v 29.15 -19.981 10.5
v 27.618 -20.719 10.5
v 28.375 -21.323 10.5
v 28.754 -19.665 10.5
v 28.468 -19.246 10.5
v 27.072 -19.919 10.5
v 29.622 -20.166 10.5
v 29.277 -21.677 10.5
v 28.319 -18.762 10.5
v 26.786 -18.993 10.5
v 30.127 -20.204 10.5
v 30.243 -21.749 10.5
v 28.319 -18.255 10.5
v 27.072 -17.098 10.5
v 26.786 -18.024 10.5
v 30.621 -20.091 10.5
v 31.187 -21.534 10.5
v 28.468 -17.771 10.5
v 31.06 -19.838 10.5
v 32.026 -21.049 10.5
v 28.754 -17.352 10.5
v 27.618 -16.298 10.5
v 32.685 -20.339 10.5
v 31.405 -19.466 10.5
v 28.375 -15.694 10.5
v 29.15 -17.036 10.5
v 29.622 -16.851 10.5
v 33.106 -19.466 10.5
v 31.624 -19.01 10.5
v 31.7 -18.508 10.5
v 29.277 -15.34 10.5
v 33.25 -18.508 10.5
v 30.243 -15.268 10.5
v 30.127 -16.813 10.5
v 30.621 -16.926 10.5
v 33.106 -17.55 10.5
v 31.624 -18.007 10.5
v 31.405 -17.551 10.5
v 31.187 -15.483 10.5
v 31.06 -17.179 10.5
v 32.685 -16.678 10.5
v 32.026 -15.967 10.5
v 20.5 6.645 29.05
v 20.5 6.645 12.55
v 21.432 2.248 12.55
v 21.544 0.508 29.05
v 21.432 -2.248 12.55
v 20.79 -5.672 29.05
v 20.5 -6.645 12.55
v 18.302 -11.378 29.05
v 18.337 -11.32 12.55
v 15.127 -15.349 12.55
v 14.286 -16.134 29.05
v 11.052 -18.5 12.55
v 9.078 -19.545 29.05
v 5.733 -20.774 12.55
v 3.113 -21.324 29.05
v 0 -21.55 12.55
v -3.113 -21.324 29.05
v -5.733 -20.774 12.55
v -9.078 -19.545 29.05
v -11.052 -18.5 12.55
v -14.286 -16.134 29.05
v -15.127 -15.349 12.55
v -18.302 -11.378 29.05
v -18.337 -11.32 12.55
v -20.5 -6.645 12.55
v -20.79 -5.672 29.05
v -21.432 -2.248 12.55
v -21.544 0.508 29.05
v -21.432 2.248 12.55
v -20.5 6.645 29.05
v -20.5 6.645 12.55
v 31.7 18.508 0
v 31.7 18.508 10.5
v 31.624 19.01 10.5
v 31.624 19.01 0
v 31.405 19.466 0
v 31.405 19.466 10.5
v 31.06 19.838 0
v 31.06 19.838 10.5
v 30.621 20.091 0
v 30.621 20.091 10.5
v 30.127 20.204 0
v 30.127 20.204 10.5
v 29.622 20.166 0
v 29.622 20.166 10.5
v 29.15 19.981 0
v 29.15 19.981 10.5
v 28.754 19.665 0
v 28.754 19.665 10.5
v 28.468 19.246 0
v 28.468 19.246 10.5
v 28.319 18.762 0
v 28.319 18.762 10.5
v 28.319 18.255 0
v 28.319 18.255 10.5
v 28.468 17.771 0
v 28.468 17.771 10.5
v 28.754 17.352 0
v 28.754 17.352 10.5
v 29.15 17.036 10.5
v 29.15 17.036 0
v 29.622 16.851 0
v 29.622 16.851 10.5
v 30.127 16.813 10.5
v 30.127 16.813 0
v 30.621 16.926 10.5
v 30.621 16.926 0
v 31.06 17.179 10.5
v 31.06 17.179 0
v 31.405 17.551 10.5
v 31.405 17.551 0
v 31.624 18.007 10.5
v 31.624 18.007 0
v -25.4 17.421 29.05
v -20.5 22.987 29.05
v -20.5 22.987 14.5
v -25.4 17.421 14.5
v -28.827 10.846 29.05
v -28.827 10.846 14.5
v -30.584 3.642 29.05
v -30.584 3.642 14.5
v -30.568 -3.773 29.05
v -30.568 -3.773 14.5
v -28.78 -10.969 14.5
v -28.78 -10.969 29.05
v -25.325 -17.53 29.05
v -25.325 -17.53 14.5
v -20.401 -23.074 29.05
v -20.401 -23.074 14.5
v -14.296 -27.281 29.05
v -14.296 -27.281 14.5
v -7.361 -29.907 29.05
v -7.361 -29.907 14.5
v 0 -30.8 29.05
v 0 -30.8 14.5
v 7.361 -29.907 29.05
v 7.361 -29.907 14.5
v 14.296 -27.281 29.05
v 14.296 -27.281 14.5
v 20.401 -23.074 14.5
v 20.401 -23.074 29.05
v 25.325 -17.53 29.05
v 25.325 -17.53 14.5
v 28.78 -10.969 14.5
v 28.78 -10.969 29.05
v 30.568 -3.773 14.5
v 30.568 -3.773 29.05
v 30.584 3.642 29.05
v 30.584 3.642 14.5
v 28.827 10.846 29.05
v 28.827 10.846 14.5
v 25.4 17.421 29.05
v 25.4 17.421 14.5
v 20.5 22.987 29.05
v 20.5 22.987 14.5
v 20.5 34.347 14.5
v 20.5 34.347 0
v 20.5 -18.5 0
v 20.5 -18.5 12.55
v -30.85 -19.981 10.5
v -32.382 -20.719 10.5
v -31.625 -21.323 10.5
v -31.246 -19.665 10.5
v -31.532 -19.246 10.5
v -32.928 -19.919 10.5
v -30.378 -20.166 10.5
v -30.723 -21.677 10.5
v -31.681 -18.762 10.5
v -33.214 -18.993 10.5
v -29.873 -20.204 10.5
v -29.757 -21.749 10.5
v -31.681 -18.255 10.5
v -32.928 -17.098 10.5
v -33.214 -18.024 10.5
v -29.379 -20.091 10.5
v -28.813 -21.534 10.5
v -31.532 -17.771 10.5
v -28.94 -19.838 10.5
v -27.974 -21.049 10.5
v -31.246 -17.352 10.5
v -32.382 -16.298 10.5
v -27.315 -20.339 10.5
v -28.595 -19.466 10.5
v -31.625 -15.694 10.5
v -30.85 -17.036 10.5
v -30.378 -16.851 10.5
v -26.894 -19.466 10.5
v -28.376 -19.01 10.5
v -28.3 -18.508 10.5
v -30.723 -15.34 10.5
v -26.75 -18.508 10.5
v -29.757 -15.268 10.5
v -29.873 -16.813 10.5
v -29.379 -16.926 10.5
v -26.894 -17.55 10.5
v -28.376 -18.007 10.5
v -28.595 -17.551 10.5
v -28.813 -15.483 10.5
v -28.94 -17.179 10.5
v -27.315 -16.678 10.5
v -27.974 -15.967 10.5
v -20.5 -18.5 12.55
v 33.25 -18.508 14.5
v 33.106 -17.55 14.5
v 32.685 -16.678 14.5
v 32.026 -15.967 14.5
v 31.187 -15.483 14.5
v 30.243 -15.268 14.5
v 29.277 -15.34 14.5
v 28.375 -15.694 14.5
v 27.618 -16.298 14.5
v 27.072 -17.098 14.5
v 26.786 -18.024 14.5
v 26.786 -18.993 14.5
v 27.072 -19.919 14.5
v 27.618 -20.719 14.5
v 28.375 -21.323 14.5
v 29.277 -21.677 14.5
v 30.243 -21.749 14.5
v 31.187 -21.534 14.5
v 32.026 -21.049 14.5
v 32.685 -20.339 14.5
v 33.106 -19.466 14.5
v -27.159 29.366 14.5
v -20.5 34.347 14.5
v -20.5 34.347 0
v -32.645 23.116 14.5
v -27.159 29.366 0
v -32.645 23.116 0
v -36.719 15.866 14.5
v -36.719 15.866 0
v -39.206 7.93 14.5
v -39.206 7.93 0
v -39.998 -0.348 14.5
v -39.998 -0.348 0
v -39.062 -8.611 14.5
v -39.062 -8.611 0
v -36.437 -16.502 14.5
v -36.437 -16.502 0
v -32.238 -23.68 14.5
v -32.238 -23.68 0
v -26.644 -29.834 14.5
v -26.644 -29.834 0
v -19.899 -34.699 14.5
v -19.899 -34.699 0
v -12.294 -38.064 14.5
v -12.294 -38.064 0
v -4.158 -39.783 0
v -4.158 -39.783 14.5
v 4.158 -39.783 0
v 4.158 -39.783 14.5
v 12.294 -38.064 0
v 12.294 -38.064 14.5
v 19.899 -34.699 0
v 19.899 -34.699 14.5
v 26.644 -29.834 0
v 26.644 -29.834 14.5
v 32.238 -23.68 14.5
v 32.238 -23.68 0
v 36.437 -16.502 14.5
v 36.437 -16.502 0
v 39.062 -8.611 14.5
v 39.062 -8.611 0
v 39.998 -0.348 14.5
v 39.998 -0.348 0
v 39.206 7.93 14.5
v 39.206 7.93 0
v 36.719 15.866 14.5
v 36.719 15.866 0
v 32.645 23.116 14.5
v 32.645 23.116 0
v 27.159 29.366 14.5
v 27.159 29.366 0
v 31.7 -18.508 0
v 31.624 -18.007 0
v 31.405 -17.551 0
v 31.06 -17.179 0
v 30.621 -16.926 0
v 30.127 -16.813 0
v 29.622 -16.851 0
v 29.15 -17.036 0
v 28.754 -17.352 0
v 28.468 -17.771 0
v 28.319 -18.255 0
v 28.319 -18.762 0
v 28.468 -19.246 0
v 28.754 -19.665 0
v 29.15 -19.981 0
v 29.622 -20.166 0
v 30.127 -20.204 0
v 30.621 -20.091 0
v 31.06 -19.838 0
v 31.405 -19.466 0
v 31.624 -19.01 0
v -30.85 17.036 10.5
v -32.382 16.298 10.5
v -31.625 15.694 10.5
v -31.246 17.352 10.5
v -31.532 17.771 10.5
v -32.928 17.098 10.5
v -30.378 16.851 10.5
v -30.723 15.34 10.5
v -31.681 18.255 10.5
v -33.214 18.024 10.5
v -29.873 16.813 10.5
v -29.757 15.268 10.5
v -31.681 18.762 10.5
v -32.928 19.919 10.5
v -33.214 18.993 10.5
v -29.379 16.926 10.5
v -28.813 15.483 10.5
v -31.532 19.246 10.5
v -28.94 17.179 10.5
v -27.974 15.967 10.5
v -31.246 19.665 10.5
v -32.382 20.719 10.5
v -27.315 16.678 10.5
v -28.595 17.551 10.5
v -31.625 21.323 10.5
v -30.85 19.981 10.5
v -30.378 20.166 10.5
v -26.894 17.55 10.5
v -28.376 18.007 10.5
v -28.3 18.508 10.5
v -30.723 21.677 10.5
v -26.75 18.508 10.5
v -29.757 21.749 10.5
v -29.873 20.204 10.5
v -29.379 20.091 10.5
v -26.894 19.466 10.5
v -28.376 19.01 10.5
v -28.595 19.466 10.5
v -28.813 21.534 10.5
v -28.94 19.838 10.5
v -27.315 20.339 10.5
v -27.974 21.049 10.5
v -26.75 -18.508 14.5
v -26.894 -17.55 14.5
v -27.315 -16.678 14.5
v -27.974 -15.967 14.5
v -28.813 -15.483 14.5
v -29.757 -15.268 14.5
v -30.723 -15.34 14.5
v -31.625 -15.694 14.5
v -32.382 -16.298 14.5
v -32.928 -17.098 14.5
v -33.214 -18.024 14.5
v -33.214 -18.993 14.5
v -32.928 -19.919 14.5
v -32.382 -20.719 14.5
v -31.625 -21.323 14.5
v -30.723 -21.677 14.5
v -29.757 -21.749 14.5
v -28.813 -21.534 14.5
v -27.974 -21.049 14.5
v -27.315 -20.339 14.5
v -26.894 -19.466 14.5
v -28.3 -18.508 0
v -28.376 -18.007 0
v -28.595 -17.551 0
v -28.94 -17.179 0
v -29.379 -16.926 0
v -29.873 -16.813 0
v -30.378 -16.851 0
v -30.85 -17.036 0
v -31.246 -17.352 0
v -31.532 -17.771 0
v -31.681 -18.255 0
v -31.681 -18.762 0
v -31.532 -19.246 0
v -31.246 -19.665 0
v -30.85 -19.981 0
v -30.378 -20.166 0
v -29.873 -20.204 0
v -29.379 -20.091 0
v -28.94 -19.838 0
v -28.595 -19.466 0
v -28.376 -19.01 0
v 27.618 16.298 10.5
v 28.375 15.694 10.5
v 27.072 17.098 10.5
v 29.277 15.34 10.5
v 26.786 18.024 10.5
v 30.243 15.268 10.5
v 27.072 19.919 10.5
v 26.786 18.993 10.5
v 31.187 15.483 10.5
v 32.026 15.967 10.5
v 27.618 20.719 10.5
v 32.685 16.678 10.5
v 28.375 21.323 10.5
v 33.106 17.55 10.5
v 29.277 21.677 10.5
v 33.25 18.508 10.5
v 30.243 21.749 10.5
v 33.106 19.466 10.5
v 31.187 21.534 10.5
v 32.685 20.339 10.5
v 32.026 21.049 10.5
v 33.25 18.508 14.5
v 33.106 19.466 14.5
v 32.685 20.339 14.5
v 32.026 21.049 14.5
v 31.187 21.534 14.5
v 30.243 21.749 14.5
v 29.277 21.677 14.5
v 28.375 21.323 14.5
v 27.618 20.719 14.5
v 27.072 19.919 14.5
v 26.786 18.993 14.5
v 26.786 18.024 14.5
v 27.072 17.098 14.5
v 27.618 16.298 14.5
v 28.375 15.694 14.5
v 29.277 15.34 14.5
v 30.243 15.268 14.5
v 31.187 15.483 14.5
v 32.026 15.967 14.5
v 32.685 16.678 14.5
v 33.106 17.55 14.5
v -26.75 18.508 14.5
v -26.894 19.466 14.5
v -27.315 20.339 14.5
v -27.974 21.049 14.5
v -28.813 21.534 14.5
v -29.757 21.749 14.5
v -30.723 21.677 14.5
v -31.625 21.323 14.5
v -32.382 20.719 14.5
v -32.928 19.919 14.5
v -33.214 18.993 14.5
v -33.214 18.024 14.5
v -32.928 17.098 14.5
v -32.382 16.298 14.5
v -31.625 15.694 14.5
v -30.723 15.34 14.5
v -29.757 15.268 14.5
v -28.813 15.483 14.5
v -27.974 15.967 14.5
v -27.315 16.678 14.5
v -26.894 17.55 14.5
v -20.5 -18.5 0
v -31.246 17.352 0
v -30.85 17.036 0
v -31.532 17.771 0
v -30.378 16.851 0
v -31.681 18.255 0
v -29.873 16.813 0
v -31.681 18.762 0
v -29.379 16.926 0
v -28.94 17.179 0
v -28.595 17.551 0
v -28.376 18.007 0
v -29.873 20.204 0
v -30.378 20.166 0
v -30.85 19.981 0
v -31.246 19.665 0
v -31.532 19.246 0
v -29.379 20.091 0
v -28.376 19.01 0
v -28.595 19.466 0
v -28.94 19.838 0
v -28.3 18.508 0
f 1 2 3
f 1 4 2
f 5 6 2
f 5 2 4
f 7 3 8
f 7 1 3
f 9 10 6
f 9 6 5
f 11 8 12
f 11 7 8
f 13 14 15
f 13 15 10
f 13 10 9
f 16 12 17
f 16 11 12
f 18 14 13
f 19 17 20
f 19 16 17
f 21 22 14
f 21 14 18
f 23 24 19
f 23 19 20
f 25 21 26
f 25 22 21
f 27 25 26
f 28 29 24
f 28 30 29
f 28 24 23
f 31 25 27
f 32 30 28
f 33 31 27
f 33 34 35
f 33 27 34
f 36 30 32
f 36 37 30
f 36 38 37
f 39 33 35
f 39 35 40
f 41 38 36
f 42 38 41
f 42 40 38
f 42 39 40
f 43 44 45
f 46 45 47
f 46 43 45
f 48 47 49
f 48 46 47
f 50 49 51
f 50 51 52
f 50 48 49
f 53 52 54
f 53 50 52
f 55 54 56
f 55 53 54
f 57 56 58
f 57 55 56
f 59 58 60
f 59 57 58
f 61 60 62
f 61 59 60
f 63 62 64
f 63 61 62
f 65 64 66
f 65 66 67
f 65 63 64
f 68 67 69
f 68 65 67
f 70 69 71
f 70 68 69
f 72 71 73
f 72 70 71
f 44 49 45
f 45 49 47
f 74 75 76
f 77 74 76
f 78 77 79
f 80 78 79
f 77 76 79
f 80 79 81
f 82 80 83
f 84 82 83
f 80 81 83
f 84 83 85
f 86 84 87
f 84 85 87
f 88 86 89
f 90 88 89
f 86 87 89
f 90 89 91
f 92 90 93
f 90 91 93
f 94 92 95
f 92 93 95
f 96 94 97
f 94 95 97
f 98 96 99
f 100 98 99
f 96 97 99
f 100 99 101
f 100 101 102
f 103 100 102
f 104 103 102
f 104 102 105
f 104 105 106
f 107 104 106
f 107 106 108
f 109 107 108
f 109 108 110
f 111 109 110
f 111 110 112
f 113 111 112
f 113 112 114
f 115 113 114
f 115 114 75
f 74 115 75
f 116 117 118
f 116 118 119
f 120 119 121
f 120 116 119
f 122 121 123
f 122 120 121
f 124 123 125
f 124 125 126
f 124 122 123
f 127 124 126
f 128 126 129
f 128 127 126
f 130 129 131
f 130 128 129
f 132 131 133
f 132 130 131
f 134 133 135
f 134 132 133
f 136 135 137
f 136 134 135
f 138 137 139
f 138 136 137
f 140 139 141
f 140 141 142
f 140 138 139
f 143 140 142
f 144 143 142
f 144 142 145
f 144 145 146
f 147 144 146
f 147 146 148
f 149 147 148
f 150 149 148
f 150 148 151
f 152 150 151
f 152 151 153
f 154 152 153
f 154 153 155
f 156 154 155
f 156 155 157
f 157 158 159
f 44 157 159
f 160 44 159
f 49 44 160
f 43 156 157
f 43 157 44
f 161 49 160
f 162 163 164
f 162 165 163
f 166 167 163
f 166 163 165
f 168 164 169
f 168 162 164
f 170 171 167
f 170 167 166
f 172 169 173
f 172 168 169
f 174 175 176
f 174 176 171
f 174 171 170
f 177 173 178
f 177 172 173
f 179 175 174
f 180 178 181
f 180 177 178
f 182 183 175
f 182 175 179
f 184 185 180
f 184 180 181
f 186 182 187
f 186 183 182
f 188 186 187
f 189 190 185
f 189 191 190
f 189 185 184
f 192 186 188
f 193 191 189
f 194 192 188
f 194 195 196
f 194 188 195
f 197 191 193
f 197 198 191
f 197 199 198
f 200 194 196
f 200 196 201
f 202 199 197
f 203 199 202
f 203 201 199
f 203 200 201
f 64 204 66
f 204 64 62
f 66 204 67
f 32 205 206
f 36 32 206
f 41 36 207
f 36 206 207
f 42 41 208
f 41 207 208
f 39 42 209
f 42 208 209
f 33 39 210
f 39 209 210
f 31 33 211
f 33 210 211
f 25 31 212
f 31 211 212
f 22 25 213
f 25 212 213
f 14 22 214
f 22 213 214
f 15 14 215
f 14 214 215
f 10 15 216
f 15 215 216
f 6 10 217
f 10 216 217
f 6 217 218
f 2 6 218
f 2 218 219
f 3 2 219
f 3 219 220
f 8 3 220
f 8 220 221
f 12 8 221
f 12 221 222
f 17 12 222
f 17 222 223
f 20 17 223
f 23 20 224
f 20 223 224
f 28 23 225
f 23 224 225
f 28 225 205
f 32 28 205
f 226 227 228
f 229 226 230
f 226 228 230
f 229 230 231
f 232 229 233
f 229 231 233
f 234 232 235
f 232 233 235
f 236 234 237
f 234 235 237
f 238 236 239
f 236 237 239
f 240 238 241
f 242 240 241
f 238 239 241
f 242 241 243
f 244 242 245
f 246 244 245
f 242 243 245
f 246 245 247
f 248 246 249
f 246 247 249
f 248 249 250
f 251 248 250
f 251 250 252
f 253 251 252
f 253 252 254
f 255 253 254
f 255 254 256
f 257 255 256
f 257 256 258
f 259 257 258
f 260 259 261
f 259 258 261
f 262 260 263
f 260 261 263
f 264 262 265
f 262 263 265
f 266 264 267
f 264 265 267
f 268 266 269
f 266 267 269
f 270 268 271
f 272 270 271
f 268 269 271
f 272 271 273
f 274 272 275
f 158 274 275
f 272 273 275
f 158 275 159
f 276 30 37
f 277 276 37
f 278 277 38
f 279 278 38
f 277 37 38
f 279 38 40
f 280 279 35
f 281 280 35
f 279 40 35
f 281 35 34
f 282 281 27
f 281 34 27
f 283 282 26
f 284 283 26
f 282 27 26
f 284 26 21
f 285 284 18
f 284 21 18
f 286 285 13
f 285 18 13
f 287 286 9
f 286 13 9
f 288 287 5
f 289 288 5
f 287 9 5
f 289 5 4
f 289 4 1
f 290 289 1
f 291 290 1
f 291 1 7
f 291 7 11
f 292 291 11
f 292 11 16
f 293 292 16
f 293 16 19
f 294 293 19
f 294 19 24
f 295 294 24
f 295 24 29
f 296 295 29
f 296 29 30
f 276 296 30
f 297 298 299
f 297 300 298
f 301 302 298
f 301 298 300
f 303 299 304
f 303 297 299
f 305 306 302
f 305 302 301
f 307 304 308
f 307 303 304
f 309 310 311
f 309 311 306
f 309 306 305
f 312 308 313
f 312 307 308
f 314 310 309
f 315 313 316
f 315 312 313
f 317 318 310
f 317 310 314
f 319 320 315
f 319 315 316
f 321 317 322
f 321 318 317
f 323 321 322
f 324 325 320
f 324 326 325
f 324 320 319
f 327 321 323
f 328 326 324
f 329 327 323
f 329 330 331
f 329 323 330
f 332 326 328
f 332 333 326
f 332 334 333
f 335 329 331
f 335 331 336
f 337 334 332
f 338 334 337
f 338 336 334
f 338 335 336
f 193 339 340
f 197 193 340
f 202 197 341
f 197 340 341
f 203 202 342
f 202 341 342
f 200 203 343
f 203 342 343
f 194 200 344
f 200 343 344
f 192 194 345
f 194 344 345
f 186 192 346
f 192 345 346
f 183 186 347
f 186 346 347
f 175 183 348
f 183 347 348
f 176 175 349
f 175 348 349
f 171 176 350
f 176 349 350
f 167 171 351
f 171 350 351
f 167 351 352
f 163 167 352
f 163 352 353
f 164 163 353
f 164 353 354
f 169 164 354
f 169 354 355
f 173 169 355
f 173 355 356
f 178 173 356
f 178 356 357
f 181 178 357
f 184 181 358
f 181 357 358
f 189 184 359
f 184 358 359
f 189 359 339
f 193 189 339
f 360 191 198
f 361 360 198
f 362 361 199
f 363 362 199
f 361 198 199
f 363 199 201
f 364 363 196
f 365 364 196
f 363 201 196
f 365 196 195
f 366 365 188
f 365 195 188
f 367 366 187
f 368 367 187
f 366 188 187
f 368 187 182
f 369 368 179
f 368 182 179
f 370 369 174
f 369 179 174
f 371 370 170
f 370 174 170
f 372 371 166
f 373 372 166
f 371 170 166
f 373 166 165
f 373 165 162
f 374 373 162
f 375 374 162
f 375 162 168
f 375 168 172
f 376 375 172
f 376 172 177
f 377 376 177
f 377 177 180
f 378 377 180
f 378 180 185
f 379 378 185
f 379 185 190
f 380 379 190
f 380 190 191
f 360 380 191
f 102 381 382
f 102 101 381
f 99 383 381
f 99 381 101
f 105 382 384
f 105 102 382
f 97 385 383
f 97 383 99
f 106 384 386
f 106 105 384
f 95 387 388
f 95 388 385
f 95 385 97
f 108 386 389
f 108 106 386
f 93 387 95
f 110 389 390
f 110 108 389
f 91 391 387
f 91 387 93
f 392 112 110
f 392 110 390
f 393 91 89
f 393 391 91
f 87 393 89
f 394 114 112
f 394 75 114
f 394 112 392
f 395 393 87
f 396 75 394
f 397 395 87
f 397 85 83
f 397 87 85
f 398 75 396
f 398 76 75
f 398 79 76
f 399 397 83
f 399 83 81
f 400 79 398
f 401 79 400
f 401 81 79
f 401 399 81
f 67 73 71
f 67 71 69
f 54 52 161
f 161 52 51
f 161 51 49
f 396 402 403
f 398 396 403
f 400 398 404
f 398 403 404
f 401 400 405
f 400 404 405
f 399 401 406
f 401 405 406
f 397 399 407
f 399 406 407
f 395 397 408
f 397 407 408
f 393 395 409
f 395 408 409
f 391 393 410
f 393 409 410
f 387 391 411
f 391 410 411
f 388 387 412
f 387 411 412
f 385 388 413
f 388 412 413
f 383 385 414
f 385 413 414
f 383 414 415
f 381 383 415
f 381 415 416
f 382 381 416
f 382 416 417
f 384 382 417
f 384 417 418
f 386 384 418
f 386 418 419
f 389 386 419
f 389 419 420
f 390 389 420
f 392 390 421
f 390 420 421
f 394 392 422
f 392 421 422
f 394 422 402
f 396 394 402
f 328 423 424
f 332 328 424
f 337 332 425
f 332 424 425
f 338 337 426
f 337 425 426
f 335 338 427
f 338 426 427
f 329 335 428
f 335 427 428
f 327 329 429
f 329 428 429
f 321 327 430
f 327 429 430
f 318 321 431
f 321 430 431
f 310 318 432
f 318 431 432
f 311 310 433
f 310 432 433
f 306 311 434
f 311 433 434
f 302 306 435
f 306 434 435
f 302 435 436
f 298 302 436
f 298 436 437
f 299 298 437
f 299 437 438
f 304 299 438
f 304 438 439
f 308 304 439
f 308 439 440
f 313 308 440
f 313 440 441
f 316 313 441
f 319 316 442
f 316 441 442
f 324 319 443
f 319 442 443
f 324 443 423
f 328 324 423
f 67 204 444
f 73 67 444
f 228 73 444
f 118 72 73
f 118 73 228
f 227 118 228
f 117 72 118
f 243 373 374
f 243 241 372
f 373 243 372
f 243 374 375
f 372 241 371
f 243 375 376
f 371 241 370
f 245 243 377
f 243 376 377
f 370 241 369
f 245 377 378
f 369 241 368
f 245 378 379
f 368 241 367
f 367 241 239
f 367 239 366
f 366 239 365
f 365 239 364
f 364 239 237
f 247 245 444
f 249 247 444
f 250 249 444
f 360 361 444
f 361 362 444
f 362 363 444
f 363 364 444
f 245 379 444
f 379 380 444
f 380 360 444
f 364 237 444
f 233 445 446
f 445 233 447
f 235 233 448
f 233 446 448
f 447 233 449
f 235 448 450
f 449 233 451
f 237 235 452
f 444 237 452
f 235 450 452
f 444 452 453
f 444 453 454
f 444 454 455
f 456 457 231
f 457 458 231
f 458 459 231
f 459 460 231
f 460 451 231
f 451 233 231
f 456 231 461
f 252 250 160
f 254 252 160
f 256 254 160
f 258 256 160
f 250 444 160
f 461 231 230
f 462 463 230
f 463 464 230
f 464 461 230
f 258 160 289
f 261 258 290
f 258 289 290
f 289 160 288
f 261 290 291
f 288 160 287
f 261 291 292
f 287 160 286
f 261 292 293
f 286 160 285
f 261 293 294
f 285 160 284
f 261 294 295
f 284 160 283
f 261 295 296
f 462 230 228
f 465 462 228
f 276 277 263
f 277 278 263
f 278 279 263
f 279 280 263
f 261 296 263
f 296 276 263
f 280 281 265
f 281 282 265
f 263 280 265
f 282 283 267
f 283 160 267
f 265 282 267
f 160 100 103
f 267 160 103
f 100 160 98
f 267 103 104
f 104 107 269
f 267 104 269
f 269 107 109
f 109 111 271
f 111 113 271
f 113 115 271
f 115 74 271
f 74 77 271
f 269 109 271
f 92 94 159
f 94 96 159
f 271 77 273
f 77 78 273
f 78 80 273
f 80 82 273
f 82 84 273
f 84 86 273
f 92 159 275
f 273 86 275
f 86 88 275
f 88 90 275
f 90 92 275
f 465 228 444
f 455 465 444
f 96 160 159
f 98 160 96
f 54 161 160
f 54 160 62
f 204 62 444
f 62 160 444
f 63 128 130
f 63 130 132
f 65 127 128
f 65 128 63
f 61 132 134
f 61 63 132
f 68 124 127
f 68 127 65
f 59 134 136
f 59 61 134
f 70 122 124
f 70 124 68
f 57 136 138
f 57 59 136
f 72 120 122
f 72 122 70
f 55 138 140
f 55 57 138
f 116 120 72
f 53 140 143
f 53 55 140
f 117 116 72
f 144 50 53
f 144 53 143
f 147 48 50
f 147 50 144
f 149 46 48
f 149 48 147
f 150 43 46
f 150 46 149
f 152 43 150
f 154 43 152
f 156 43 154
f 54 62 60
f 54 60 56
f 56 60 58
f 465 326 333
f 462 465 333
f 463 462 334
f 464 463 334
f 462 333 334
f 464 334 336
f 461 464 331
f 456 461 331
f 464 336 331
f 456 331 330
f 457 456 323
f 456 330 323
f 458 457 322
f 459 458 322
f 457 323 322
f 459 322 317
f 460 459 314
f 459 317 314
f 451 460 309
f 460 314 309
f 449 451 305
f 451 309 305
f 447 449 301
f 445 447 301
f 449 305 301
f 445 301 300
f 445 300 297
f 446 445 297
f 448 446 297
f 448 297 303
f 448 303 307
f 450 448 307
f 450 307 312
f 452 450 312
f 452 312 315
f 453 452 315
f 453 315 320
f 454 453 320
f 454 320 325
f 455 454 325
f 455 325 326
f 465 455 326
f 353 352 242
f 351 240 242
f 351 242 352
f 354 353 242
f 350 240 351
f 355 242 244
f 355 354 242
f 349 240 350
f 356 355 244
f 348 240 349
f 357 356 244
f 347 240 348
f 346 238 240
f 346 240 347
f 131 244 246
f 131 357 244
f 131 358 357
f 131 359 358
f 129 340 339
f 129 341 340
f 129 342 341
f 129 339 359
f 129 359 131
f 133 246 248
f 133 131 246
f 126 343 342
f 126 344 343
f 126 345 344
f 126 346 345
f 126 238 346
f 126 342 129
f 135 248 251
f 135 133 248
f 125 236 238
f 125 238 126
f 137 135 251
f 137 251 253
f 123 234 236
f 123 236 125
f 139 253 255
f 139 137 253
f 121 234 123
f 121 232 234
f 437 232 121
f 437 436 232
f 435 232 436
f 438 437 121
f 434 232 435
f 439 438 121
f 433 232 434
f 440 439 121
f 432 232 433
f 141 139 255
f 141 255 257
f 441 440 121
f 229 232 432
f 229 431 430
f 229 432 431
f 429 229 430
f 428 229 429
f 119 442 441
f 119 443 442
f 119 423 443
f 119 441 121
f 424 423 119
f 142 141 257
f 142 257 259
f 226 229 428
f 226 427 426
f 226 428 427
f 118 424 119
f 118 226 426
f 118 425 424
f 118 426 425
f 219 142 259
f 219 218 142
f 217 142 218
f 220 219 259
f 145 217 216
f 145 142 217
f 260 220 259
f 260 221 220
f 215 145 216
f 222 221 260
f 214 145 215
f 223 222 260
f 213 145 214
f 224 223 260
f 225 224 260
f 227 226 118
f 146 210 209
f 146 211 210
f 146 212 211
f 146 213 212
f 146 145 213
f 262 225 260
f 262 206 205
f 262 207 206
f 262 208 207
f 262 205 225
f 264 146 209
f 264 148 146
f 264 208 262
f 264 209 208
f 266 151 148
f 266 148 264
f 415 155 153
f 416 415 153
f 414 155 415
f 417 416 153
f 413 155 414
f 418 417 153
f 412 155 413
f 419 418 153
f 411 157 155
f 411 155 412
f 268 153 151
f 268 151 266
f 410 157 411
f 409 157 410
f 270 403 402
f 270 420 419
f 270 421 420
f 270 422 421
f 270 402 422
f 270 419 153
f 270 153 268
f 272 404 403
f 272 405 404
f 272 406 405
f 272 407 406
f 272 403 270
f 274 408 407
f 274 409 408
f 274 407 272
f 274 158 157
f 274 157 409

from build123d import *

# Parameters (mm, degrees)
BOSS_EXTRUDE1_DEPTH = 14.5
SKETCH1_R           = 21.549999999999997
CUT_EXTRUDE1_DEPTH  = 1.95
BOSS_EXTRUDE3_START = 14.55
BOSS_EXTRUDE3_DEPTH = 16.5
SKETCH4_R           = 1.6999999999999995
CUT_EXTRUDE2_DEPTH  = 59.40978085903079
SKETCH5_R           = 3.2500000000000004
CUT_EXTRUDE3_DEPTH  = 4


with BuildPart() as part:
    # Sketch2 → Boss-Extrude1 (new body)
    with BuildSketch(Plane.XY):
        with BuildLine():
            Line((-20.50000000000001, -18.5), (-20.500000000000018, 34.34748899119118))
            ThreePointArc((-20.500000000000014, 34.347488991191184), (-19.7484176581315, -34.78505426185217), (40, -9.8e-15))
            ThreePointArc((40, 0), (34.785054261852174, 19.748417658131498), (20.500000000000004, 34.347488991191184))
            Line((20.5, 34.347488991191184), (20.5, -18.5))
            Line((20.500000000000004, -18.5), (-20.50000000000001, -18.5))
        make_face()
    extrude(amount=BOSS_EXTRUDE1_DEPTH)

    # Sketch1 → Cut-Extrude1 (cut)
    with BuildSketch(Plane.XY.offset(14.5)):
        Circle(SKETCH1_R)
    extrude(amount=-CUT_EXTRUDE1_DEPTH, mode=Mode.SUBTRACT)

    # Sketch1<3> → Boss-Extrude3 (add)
    with BuildSketch(Plane.XY.offset(14.5).offset(BOSS_EXTRUDE3_START)):
        with BuildLine():
            Line((20.5, -6.644734757685281), (20.5, -18.5))
            Line((20.5, -18.5), (11.052262211872641, -18.5))
            ThreePointArc((11.052262211872707, -18.500000000000284), (-5.0161e-13, -21.549999999999997), (-11.052262211873552, -18.49999999999978))
            Line((-11.0522622118736, -18.5), (-20.500000000000014, -18.5))
            Line((-20.50000000000001, -18.5), (-20.50000000000001, -6.644734757685747))
            ThreePointArc((-20.500000000000068, -6.644734757685756), (-21.549999999999997, 2.64e-15), (-20.500000000000064, 6.64473475768576))
            Line((-20.500000000000014, 6.644734757685754), (-20.500000000000018, 22.986735305389928))
            ThreePointArc((-20.499999999998952, 22.98673530538957), (-12.594443219135018, -28.107294426891826), (30.800000000000004, -7.54e-15))
            ThreePointArc((30.800000000000004, 0), (28.107294426892086, 12.594443219134437), (20.499999999999915, 22.98673530538871))
            Line((20.5, 22.98673530538874), (20.5, 6.644734757685303))
            ThreePointArc((20.500000000000203, 6.644734757685333), (21.285881471059685, 3.3635918301716967), (21.549999999999997, 0))
            ThreePointArc((21.549999999999997, -5.28e-15), (21.285881471059685, -3.3635918301717003), (20.500000000000206, -6.644734757685318))
        make_face()
        with BuildLine():
            Line((-20.500000000000014, -18.5), (-11.0522622118736, -18.5))
            ThreePointArc((-11.052262211873552, -18.49999999999978), (-16.852986120065246, -13.430538292893852), (-20.500000000000068, -6.644734757685756))
            Line((-20.50000000000001, -6.644734757685747), (-20.50000000000001, -18.5))
        make_face()
        with BuildLine():
            Line((11.052262211872641, -18.5), (20.5, -18.5))
            Line((20.5, -18.5), (20.5, -6.644734757685281))
            ThreePointArc((20.500000000000206, -6.644734757685318), (16.852986120065083, -13.430538292894052), (11.052262211872707, -18.500000000000284))
        make_face()
    extrude(amount=-BOSS_EXTRUDE3_DEPTH)

    # Sketch4 → Cut-Extrude2 (cut, through all)
    with BuildSketch(Plane.XY.offset(14.5)):
        with Locations((30, 18.508444018879594)):
            Circle(SKETCH4_R)
        with Locations((30, -18.508444018879594)):
            Circle(SKETCH4_R)
        with Locations((-30, 18.508444018879594)):
            Circle(SKETCH4_R)
        with Locations((-30, -18.508444018879594)):
            Circle(SKETCH4_R)
    extrude(amount=-CUT_EXTRUDE2_DEPTH, mode=Mode.SUBTRACT)

    # Sketch5 → Cut-Extrude3 (cut)
    with BuildSketch(Plane.XY.offset(14.5)):
        with Locations((-30, 18.508444018879594)):
            Circle(SKETCH5_R)
        with Locations((30, 18.508444018879594)):
            Circle(SKETCH5_R)
        with Locations((30, -18.508444018879594)):
            Circle(SKETCH5_R)
        with Locations((-30, -18.508444018879594)):
            Circle(SKETCH5_R)
    extrude(amount=-CUT_EXTRUDE3_DEPTH, mode=Mode.SUBTRACT)


solid = part.part
